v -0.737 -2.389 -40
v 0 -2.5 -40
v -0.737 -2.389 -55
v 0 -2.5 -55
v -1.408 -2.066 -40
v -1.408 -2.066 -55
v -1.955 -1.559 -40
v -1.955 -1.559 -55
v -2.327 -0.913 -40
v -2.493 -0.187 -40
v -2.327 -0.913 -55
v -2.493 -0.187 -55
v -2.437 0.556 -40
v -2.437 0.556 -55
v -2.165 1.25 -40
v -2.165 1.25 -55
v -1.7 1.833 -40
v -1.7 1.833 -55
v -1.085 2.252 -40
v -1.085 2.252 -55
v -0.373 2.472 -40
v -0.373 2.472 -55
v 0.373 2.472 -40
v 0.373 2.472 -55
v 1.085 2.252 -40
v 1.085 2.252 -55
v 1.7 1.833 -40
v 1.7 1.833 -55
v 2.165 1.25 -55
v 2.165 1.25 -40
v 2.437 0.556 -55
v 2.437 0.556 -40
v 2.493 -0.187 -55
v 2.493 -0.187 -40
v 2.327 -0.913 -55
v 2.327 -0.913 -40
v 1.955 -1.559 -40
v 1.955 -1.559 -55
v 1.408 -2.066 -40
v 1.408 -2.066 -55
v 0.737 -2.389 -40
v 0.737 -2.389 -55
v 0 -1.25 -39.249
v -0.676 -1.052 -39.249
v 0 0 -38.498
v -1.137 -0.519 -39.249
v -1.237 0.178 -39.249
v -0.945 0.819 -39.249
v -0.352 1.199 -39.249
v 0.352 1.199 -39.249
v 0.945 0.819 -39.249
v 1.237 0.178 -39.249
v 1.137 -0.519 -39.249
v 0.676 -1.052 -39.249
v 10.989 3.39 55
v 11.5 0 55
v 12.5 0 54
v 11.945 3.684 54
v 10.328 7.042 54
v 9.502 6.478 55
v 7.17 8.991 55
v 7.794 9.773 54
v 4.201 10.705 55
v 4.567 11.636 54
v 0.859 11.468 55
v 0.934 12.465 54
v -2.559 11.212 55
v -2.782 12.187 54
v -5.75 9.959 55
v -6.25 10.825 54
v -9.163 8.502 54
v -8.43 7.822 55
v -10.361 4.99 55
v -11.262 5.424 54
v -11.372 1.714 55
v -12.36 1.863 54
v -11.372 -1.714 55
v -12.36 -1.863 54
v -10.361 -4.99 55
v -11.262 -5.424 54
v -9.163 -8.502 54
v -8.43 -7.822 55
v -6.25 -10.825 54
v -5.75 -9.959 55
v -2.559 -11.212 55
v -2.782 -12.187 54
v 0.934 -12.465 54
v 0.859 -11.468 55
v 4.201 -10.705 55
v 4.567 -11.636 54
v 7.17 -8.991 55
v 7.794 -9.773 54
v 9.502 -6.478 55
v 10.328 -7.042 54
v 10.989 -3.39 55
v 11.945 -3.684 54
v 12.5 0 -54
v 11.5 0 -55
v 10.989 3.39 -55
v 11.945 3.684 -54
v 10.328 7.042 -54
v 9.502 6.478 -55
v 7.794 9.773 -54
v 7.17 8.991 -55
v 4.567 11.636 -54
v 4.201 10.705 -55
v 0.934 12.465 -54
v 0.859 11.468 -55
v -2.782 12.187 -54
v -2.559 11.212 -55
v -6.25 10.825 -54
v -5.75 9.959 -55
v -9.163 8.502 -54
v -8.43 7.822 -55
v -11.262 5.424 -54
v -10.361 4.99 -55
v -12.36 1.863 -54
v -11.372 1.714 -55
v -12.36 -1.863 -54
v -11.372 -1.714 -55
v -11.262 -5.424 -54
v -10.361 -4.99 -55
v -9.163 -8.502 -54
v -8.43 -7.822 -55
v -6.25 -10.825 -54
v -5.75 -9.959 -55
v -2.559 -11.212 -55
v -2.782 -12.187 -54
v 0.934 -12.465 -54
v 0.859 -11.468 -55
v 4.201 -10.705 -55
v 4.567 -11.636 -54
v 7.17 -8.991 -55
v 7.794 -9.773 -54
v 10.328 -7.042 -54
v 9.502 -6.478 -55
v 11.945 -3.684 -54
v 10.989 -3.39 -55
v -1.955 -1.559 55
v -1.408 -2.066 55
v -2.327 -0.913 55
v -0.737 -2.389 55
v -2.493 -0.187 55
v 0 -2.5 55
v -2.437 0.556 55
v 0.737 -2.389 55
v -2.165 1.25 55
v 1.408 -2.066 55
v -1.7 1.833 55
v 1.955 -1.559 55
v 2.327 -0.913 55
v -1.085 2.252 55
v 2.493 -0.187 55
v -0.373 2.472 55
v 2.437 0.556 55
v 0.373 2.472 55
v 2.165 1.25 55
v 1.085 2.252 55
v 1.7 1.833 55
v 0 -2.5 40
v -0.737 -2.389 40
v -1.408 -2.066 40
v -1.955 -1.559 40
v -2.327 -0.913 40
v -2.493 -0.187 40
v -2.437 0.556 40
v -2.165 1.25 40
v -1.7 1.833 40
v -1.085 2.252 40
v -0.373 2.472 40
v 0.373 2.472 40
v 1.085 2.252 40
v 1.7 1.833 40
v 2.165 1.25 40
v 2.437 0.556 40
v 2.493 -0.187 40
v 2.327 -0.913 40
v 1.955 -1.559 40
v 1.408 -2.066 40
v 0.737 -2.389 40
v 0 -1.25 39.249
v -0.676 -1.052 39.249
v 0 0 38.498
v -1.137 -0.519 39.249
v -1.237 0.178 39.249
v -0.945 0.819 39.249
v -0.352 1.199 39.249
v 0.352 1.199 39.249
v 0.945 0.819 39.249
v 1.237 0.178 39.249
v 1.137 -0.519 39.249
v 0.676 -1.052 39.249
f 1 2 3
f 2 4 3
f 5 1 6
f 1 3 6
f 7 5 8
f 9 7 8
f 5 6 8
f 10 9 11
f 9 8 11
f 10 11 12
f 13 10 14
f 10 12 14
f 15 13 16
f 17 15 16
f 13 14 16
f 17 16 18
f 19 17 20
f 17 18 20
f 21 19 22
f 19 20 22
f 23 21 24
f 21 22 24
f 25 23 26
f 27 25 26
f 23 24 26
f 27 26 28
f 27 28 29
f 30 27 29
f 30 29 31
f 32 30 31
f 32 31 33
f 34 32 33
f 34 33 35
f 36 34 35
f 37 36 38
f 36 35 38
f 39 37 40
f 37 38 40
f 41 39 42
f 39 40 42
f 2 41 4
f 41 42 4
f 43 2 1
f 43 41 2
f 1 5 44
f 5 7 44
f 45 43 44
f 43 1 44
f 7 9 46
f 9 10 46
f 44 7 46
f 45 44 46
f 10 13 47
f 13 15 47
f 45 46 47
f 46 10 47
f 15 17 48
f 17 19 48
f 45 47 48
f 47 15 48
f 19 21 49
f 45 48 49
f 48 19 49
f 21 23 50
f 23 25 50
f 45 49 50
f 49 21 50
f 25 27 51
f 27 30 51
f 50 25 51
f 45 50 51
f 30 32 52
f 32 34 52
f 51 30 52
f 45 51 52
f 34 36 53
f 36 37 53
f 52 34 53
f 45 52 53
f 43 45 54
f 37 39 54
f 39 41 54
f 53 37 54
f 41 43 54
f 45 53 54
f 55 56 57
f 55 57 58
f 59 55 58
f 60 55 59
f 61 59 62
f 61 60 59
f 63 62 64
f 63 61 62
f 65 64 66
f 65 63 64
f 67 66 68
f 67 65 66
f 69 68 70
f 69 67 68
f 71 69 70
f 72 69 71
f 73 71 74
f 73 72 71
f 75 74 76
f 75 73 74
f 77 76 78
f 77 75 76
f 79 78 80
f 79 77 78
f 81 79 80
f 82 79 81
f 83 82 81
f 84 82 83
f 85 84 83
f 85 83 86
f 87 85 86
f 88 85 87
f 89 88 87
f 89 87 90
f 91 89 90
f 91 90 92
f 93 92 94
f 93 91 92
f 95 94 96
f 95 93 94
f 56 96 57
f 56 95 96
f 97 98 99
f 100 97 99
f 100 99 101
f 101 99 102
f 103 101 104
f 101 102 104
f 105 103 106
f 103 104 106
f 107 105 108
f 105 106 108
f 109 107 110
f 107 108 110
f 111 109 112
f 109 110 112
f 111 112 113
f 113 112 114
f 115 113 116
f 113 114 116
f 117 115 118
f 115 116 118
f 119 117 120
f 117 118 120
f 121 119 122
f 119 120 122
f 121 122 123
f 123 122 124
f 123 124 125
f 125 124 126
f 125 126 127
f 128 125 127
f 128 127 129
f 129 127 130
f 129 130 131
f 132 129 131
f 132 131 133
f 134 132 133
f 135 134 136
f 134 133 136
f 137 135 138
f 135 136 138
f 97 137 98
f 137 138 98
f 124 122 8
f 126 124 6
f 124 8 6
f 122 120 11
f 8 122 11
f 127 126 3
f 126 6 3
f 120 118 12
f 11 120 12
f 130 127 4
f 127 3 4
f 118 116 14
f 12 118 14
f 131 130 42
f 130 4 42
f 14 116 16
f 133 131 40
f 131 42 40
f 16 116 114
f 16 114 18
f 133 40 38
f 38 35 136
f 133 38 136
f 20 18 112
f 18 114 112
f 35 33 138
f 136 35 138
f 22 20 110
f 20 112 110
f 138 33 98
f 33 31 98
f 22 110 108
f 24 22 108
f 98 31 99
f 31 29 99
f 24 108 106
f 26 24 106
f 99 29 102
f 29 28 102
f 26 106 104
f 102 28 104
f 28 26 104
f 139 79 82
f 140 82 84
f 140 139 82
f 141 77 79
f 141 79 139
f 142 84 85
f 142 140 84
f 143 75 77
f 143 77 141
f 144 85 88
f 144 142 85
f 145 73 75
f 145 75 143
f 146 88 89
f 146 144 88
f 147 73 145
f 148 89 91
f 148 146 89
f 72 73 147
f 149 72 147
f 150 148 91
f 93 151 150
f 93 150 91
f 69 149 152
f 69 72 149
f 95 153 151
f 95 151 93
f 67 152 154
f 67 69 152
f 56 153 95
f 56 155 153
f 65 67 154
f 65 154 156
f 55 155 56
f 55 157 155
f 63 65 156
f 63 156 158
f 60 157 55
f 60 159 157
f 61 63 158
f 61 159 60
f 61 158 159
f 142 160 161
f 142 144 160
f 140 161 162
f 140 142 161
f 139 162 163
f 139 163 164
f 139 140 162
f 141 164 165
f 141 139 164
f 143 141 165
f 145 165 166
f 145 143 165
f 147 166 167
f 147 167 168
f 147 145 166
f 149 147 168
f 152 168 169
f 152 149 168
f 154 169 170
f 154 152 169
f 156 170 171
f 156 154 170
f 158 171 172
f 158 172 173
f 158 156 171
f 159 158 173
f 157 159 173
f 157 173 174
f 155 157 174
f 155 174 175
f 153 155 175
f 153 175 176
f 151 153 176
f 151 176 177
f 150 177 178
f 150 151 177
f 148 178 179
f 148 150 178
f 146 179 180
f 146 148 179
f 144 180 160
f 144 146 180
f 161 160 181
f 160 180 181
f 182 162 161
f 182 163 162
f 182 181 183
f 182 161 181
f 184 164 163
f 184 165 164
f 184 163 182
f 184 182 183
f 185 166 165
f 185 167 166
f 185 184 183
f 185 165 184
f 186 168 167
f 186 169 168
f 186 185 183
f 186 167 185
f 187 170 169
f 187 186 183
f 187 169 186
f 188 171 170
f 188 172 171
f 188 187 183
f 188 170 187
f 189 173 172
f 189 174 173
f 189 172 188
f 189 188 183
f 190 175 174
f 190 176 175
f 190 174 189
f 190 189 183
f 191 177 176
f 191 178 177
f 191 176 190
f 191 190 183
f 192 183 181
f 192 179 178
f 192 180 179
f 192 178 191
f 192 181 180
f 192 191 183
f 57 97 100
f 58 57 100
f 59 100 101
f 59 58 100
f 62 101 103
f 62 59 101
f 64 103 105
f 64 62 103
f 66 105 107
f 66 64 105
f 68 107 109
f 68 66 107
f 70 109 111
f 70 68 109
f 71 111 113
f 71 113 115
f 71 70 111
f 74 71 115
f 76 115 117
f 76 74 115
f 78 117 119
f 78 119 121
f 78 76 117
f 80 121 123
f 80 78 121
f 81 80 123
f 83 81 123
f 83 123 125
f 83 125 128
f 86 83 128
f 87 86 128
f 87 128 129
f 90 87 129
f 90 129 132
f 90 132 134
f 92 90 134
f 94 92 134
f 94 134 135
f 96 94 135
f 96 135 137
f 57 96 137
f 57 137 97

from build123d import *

# Parameters (mm, degrees)
SKETCH1_R           = 12.5
BOSS_EXTRUDE1_DEPTH = 55
CHAMFER1_SIZE       = 1


with BuildPart() as part:
    # Sketch1 → Boss-Extrude1 (new body, symmetric)
    with BuildSketch(Plane.XY):
        Circle(SKETCH1_R)
    extrude(amount=BOSS_EXTRUDE1_DEPTH, both=True)

    # Chamfer1
    chamfer1_edges = [part.edges().sort_by_distance(p)[0] for p in [
        (-12.5, 0, -55),
        (-12.5, 0, 55),
    ]]
    chamfer(chamfer1_edges, length=CHAMFER1_SIZE)

    # Sketch4 → M6 Tapped Hole1 (revolve, cut)
    with BuildSketch(Plane(origin=(0, 0, 55), x_dir=(0, -1, 0), z_dir=(1, 0, 0))):
        Polygon((0, 0), (0, 16.502151548), (2.5, 15), (2.5, 0), align=None)
    m6_tapped_hole1 = revolve(axis=Axis((0, 0, 61.35), (0, 0, -1)), mode=Mode.SUBTRACT)

    # Mirror1: M6 Tapped Hole1 across plane
    add(m6_tapped_hole1.mirror(Plane.XY), mode=Mode.SUBTRACT)


solid = part.part
